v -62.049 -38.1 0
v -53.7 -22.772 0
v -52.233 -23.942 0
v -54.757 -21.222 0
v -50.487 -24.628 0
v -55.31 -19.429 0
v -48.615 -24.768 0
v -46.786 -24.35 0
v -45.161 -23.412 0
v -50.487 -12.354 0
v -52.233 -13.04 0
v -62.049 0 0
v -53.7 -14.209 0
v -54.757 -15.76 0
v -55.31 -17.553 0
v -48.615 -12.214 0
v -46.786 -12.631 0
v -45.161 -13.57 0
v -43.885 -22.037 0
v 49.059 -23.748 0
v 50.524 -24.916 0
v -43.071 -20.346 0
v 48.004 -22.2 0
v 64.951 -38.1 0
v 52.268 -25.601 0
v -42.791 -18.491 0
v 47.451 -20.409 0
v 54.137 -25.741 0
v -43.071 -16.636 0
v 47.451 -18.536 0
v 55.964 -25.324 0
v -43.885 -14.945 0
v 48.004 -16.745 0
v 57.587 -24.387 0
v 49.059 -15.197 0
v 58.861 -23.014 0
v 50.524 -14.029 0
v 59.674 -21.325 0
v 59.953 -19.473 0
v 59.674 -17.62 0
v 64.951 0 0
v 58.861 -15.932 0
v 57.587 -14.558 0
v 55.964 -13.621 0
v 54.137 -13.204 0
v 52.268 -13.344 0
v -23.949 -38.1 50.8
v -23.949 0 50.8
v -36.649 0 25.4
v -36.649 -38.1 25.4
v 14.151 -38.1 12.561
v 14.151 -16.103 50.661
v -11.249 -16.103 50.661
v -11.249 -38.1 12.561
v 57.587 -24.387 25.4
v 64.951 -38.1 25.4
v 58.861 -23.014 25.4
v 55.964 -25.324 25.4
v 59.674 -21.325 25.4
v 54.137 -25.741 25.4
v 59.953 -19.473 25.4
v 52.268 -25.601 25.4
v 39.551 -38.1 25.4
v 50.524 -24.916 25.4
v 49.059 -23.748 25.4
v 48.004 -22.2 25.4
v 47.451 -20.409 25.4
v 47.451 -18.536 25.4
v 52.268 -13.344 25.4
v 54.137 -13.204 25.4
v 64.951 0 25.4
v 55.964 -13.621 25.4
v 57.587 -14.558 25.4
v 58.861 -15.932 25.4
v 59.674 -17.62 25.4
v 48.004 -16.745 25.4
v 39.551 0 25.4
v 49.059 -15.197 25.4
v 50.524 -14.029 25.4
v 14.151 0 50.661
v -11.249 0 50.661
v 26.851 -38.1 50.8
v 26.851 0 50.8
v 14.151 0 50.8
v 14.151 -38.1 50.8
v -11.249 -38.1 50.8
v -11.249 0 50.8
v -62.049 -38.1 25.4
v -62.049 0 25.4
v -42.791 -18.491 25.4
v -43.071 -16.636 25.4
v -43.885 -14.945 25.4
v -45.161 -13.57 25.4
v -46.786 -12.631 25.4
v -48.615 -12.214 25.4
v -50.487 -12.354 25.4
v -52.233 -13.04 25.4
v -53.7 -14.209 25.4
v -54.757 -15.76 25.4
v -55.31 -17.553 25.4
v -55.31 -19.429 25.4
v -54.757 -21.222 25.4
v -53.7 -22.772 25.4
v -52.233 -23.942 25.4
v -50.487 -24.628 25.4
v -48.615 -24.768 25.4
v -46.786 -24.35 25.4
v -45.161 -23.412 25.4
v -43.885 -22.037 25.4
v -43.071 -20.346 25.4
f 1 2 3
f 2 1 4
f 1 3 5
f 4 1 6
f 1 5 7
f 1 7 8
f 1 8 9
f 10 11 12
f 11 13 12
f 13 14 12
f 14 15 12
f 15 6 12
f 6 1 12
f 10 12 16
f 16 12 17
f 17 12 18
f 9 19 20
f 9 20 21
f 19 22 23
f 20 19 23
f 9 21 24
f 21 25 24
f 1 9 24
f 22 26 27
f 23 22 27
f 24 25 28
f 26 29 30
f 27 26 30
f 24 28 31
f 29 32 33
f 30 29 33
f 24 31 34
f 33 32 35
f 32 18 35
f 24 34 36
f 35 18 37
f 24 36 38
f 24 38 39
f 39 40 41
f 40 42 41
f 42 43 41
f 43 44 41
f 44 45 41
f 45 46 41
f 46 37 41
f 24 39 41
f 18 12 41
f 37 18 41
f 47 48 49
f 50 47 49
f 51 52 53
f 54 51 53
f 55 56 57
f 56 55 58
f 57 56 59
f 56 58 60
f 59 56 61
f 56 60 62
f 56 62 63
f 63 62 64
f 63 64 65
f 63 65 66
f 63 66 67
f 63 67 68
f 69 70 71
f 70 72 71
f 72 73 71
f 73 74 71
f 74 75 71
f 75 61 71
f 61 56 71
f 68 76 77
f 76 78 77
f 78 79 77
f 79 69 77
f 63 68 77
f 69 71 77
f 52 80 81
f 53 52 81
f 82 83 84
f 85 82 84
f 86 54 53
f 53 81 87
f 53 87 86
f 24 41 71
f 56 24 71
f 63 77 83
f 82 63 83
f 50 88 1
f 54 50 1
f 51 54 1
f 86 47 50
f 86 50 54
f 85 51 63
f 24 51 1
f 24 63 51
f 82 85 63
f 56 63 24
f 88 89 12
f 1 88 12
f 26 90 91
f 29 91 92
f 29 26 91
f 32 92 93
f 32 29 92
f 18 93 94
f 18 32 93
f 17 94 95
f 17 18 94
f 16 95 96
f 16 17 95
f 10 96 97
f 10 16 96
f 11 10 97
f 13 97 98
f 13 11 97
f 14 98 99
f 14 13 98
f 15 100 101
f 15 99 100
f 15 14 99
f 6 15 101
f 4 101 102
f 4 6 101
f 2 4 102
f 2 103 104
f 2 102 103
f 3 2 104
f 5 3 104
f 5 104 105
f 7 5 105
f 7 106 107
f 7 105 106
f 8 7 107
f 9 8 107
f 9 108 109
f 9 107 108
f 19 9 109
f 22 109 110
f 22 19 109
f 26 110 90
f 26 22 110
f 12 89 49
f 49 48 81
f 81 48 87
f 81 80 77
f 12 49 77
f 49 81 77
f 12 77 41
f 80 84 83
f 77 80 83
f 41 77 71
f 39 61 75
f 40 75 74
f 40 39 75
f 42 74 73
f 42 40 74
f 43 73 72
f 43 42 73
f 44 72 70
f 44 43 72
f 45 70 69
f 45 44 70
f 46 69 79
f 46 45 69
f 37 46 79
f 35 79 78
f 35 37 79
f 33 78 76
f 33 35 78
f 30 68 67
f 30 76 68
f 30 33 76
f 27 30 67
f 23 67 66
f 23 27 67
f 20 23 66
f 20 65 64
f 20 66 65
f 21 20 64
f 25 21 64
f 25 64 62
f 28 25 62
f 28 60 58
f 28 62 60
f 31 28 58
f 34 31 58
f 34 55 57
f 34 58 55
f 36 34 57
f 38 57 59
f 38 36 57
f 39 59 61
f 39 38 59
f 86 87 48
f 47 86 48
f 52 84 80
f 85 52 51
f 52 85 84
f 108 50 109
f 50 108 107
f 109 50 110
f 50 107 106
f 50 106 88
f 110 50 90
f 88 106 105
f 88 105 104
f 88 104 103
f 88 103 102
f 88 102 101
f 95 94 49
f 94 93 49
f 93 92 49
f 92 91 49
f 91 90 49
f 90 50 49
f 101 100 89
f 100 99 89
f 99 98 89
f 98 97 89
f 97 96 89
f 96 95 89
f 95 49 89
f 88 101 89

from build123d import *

# Parameters (mm, degrees)
F1_DEPTH = 38.1
F2_R     = 6.29457
F2_R_2   = 6.286061
F3_DEPTH = 82.296
F4_SIZE2 = 21.997045
F4_SIZE  = 38.1


with BuildPart() as f1:
    # F0 (on Front) → F1 (new body)
    with BuildSketch(Plane.XZ):
        Polygon((-62.048577, 25.4), (-62.048577, 0), (64.951423, 0), (64.951423, 25.4), (39.551423, 25.4), (26.851423, 50.8), (14.151423, 50.8), (14.151423, 50.661036), (-11.248577, 50.661036), (-11.248577, 50.8), (-23.948577, 50.8), (-36.648577, 25.4), align=None)
    extrude(amount=F1_DEPTH)

    # F2 (on Top) → F3 (cut)
    with BuildSketch(Plane.XY):
        with Locations((-49.085889, -18.490879)):
            Circle(F2_R)
        with Locations((53.66724, -19.472597)):
            Circle(F2_R_2)
    extrude(amount=F3_DEPTH, mode=Mode.SUBTRACT)

    # F4
    f4_edges = [f1.edges().sort_by_distance(p)[0] for p in [
        (1.451423, -38.1, 50.661036),
    ]]
    chamfer(f4_edges, length=F4_SIZE, length2=F4_SIZE2)


solid = f1.part
